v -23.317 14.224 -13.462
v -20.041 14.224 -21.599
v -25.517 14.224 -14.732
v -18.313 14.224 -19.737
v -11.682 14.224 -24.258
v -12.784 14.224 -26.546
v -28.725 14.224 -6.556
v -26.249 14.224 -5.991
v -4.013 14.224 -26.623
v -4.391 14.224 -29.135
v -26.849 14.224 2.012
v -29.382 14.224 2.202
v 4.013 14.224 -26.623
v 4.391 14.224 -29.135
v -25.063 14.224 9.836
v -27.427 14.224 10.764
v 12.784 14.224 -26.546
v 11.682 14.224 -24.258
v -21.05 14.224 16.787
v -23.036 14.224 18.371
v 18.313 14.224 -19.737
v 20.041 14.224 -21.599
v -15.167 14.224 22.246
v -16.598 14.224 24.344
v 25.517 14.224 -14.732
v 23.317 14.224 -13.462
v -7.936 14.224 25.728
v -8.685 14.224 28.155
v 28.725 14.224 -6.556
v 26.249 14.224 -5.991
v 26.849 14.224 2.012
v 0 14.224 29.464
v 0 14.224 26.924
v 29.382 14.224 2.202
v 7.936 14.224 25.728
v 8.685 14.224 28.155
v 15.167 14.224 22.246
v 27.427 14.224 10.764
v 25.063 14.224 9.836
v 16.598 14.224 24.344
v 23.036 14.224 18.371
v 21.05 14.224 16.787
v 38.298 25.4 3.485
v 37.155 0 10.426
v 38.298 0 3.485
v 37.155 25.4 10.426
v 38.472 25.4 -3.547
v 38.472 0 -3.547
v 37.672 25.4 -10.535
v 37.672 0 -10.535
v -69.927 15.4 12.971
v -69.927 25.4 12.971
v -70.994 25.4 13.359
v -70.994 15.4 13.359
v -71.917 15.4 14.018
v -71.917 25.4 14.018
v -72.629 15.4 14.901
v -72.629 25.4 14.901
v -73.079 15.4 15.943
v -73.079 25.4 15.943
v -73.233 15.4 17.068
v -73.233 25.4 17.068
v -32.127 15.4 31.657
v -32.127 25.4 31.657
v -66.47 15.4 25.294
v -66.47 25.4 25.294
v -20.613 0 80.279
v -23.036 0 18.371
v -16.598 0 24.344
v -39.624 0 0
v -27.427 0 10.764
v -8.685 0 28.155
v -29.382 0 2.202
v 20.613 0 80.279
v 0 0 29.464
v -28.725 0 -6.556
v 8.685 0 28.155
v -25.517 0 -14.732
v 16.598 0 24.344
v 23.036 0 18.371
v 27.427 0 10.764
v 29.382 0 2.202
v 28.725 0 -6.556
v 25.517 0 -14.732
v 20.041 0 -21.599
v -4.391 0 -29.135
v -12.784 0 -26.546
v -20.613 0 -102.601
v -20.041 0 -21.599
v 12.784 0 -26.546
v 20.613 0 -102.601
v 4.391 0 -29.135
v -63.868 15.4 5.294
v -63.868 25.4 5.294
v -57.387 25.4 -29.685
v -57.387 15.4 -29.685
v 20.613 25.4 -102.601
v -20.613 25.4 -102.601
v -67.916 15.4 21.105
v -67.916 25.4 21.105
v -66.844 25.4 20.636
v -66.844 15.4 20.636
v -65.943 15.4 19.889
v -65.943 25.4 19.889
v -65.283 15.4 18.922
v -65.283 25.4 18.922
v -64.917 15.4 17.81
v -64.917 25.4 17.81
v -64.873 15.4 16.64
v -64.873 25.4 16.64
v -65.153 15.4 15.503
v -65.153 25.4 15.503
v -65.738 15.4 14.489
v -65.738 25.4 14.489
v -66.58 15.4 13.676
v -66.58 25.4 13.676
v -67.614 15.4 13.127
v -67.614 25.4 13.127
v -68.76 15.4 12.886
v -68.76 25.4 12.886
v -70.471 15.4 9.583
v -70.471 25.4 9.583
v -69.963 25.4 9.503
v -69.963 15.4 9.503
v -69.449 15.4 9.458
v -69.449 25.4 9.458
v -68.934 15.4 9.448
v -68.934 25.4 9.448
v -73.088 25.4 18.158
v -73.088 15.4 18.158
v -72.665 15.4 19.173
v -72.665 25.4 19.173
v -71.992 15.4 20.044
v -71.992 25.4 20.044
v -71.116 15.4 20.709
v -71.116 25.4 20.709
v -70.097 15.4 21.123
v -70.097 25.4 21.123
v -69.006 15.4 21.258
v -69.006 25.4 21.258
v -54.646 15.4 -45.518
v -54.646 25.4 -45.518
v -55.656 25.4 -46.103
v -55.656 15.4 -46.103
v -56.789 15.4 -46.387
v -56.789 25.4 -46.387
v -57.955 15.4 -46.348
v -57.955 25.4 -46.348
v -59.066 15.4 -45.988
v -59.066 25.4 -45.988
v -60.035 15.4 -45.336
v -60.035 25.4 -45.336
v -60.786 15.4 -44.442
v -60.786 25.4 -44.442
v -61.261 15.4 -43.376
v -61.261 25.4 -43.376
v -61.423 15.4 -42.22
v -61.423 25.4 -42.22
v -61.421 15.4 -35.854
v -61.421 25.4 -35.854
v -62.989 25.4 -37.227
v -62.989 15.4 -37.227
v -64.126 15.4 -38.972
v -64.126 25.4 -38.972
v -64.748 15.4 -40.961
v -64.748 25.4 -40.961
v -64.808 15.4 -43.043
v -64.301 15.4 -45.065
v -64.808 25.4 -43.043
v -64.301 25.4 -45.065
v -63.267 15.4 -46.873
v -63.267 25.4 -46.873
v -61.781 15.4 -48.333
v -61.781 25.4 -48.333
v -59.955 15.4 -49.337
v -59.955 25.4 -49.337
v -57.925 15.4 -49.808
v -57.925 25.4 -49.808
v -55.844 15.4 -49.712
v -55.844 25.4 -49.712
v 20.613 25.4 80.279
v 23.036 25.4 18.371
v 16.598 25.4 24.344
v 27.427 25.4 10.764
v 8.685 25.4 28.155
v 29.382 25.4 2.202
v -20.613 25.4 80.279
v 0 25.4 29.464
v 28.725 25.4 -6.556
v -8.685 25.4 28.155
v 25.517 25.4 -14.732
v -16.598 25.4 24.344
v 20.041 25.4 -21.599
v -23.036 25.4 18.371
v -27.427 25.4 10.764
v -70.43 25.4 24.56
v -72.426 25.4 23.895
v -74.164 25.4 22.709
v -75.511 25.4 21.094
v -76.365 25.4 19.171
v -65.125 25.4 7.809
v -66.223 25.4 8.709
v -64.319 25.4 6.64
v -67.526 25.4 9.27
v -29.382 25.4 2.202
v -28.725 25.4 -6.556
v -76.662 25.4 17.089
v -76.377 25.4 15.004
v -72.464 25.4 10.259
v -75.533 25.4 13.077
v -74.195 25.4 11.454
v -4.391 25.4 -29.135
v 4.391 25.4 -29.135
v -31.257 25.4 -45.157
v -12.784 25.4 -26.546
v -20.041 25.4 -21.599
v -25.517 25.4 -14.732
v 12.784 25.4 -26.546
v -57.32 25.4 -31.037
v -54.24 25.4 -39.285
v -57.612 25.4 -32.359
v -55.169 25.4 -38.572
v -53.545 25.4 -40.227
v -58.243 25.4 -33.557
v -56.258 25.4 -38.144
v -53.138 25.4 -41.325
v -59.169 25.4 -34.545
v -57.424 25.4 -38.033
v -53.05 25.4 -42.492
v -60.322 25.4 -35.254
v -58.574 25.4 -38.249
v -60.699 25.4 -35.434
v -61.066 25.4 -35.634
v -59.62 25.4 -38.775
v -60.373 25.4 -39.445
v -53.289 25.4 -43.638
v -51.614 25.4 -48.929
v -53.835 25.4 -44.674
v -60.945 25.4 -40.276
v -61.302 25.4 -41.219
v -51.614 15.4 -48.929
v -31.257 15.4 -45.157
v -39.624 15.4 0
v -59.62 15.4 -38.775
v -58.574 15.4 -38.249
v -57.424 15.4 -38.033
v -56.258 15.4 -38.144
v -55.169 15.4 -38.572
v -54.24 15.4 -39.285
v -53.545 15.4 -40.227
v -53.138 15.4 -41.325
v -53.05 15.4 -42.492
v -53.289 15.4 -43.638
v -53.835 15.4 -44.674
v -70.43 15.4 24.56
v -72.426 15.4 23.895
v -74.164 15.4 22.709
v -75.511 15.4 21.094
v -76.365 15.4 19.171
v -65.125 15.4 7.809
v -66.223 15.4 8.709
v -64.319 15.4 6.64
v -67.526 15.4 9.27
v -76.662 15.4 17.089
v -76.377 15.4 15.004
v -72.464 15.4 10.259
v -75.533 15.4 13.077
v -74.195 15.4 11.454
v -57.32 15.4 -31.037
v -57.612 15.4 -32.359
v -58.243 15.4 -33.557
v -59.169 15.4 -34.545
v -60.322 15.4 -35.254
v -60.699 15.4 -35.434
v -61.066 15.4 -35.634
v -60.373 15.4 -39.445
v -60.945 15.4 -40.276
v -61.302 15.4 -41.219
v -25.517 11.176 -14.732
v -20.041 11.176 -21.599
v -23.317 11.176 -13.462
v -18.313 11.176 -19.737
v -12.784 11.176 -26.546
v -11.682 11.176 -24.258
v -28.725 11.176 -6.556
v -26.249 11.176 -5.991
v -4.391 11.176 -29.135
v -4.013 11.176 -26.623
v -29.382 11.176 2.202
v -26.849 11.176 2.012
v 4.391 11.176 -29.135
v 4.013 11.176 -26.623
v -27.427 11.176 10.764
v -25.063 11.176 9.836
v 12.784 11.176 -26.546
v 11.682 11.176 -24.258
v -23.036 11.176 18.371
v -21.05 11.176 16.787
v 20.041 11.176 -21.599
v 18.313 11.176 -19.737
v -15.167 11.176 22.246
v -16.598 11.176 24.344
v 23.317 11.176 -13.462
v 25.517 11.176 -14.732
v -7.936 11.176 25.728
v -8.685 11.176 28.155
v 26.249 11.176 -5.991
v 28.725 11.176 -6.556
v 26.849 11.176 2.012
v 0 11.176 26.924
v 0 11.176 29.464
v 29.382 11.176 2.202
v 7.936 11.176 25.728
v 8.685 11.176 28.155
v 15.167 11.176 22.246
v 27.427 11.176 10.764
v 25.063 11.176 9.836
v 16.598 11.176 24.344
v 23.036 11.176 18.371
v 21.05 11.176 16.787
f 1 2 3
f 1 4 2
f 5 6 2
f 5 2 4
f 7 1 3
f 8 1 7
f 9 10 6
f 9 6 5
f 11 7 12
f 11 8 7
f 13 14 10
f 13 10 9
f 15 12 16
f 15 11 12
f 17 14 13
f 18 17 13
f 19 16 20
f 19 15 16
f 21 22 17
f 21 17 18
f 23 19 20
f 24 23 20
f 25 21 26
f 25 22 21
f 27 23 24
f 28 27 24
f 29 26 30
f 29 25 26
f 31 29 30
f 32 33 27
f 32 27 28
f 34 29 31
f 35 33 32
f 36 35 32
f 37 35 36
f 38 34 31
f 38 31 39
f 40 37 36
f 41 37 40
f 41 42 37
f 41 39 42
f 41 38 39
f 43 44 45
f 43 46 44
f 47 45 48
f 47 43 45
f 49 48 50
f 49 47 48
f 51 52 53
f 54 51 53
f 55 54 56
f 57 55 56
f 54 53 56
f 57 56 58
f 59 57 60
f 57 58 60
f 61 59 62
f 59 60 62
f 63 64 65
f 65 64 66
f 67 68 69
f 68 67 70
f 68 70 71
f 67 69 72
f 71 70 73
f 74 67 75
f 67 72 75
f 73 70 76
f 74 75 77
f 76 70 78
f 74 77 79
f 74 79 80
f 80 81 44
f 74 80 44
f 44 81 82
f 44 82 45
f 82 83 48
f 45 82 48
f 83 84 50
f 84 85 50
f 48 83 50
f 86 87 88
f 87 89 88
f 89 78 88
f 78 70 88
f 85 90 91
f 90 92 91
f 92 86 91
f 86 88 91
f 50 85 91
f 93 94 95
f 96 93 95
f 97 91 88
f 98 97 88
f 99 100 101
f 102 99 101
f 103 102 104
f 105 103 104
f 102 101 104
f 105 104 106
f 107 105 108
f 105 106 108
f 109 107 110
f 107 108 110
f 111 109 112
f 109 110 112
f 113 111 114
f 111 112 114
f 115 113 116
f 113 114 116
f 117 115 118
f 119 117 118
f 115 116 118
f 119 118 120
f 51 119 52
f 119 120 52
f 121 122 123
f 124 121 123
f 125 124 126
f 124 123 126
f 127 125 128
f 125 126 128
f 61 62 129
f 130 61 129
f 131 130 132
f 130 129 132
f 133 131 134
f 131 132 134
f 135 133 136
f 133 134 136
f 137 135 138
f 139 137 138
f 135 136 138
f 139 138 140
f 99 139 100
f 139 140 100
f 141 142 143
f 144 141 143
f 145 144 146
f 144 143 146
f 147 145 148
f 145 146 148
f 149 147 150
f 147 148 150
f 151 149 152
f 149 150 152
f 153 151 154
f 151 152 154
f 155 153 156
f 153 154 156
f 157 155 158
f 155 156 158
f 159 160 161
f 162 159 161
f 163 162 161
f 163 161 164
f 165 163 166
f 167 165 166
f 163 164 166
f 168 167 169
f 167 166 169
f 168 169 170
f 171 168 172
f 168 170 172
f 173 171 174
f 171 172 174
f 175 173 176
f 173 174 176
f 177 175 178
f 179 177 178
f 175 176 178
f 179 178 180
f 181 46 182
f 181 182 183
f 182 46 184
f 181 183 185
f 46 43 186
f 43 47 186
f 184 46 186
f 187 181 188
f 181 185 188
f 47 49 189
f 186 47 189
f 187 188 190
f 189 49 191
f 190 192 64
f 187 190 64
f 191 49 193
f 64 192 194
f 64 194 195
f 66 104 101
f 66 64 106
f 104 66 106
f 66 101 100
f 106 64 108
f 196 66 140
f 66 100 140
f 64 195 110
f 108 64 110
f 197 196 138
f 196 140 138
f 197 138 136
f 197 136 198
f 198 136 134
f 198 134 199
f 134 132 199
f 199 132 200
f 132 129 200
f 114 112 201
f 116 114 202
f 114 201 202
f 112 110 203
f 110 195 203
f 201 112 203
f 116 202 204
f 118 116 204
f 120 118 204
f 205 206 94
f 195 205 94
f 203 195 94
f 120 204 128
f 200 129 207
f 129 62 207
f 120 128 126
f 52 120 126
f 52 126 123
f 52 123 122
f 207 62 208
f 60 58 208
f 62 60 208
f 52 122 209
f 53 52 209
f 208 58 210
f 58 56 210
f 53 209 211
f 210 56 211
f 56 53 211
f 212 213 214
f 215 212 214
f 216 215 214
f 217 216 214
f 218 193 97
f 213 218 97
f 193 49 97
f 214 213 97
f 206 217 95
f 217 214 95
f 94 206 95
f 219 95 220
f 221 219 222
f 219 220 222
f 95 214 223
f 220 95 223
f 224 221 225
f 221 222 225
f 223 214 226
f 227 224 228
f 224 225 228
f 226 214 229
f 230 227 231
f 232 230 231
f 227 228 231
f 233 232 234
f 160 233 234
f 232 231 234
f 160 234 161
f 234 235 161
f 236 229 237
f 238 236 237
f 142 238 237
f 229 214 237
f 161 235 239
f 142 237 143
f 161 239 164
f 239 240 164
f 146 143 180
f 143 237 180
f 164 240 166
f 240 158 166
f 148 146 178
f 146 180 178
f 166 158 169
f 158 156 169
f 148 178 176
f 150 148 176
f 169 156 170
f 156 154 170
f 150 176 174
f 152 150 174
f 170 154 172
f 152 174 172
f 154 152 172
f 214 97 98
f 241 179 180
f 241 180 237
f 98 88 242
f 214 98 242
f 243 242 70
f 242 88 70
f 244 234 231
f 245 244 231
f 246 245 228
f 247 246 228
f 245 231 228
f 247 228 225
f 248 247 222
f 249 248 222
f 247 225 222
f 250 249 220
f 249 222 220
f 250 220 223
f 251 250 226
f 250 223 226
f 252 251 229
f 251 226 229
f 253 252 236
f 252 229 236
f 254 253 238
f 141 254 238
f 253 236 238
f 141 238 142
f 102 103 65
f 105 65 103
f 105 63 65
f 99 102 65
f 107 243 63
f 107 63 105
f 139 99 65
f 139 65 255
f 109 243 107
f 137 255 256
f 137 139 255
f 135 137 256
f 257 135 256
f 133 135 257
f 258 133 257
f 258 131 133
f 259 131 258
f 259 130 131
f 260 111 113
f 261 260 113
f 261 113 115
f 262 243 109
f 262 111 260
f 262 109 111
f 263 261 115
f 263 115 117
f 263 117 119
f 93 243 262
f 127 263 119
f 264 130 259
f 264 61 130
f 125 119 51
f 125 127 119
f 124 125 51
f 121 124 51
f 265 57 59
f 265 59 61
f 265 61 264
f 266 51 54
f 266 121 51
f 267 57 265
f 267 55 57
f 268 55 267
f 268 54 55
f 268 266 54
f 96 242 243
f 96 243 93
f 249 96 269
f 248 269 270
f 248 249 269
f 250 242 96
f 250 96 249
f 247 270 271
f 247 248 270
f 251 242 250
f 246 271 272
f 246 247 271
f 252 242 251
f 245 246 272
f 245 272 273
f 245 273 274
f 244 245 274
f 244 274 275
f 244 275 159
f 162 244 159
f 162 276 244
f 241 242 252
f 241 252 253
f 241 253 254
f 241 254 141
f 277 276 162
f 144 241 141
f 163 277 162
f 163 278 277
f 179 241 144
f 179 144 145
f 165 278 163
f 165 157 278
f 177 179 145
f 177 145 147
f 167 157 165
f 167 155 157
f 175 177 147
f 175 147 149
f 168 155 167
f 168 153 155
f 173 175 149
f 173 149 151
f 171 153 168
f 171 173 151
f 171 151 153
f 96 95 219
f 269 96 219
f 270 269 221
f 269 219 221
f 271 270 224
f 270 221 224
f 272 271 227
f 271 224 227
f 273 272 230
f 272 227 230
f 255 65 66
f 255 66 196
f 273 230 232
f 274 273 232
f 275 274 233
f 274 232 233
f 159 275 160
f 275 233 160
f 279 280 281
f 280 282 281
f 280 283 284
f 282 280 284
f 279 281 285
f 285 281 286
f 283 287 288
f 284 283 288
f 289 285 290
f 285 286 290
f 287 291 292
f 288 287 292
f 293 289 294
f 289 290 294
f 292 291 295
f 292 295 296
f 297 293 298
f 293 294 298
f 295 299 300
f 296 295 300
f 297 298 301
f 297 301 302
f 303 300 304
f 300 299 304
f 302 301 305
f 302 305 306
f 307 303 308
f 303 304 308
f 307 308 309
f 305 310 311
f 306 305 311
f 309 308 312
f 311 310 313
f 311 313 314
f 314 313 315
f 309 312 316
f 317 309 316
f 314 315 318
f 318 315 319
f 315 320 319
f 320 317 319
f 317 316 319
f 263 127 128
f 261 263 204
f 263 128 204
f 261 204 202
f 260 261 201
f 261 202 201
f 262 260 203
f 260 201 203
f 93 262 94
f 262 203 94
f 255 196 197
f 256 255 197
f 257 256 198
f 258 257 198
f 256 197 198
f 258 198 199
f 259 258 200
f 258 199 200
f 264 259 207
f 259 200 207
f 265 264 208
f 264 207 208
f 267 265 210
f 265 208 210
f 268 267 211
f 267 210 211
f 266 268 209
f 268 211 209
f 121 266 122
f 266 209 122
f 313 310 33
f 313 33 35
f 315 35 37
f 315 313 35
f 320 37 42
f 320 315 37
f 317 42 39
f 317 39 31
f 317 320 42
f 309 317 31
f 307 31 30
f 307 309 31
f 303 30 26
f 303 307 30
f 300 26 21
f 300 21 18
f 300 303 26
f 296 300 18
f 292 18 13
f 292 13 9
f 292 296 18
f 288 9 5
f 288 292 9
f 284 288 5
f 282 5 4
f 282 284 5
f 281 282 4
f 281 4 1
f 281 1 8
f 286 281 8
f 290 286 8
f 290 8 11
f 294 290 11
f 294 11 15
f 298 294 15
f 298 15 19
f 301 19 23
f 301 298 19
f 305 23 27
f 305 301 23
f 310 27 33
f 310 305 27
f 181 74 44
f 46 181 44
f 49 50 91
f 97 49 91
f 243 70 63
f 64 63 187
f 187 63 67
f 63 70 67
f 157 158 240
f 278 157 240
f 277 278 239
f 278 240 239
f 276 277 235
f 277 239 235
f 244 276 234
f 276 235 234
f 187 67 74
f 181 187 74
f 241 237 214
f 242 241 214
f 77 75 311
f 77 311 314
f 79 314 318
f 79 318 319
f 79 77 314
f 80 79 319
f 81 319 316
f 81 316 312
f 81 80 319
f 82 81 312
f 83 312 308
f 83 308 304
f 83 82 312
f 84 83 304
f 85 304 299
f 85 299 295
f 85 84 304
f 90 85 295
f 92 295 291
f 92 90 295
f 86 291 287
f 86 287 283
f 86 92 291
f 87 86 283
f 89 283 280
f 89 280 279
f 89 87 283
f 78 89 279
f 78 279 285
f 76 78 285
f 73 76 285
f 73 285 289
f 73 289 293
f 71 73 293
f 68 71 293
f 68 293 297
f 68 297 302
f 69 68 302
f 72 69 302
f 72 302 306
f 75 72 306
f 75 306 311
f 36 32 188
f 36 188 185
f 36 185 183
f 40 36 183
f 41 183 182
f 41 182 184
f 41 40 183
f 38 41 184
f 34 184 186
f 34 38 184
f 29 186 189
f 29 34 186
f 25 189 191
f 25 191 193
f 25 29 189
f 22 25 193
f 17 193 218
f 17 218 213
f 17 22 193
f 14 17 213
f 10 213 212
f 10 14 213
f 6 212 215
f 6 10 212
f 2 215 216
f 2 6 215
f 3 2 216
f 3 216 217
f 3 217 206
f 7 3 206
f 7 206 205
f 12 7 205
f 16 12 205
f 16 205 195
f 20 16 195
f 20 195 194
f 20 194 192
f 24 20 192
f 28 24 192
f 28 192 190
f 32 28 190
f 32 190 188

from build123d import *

# Parameters (mm, degrees)
SKETCH1_R                      = 29.464
BASE_DEPTH                     = 25.4
FILLET2_R                      = 50.8
BOSS_EXTRUDE3_DEPTH            = 10
MID_FEATURE_BEARING_DEPTH      = 1.524
MID_FEATURE_BEARING_DEPTH_BACK = 1.524
SKETCH8_R                      = 29.464
SKETCH8_R_2                    = 26.924


with BuildPart() as part:
    # Sketch1 → Base (new body)
    with BuildSketch(Plane(origin=(0, 0, 0), x_dir=(1, 0, 0), z_dir=(0, 1, 0))):
        Polygon((-20.613470334, -80.279427719), (20.613470334, -80.279427719), (39.624, 0), (20.613470334, 102.600572281), (-20.613470334, 102.600572281), (-39.624, 0), align=None)
        with Locations(Location((0, 0, 0), (0, 0, 270))):
            Circle(SKETCH1_R, mode=Mode.SUBTRACT)
    extrude(amount=BASE_DEPTH)

    # Fillet2
    fillet2_edges = [part.edges().sort_by_distance(p)[0] for p in [
        (39.624, 12.7, 0),
    ]]
    fillet(fillet2_edges, radius=FILLET2_R)

    # Sketch3 → Boss-Extrude3 (add)
    with BuildSketch(Plane(origin=(0, 25.4, 0), x_dir=(-1, 0, 0), z_dir=(0, -1, 0))):
        with BuildLine():
            Line((51.614471231, 48.928527053), (31.257084114, 45.156572344))
            Line((31.257084114, 45.156572344), (39.624, 0))
            Line((39.624, 0), (32.127488633, -31.65696343))
            Line((32.127488633, -31.65696343), (66.470159483, -25.293720531))
            ThreePointArc((66.470159483, -25.293720531), (67.22595128, -23.21046907), (67.916469509, -21.10468122))
            ThreePointArc((67.916469509, -21.10468122), (64.973148378, -16.061787909), (69.92712938, -12.971159419))
            ThreePointArc((69.92712938, -12.971159419), (70.219719772, -11.280308293), (70.471431194, -9.582890245))
            ThreePointArc((70.471431194, -9.582890245), (69.706370171, -9.476600605), (68.934479365, -9.448308557))
            ThreePointArc((68.934479365, -9.448308557), (65.642119146, -8.297198831), (63.868033442, -5.294315329))
            Line((63.868033442, -5.294315329), (57.38681967, 29.685048936))
            ThreePointArc((57.38681967, 29.685048936), (57.887770412, 32.979114965), (60.322037489, 35.25423396))
            ThreePointArc((60.322037489, 35.25423396), (60.883831005, 35.531602368), (61.420938914, 35.854186128))
            ThreePointArc((61.420938914, 35.854186128), (60.538035517, 37.32560322), (59.61988942, 38.775290915))
            ThreePointArc((59.61988942, 38.775290915), (53.859768583, 39.731805511), (54.646150047, 45.517608517))
            ThreePointArc((54.646150047, 45.517608517), (53.157675832, 47.247390405), (51.614471231, 48.928527053))
        make_face()
        with BuildLine():
            Line((55.84413555, 49.712227935), (51.614471231, 48.928527053))
            ThreePointArc((51.614471231, 48.928527053), (53.157675832, 47.247390405), (54.646150047, 45.517608517))
            ThreePointArc((54.646150047, 45.517608517), (59.06617769, 45.988270979), (61.423391664, 42.219755382))
            ThreePointArc((61.423391664, 42.219755382), (60.945239903, 40.275728903), (59.61988942, 38.775290915))
            ThreePointArc((59.61988942, 38.775290915), (60.538035517, 37.32560322), (61.420938914, 35.854186128))
            ThreePointArc((61.420938914, 35.854186128), (64.301460789, 45.064515776), (55.84413555, 49.712227935))
        make_face()
        with BuildLine():
            ThreePointArc((67.916469509, -21.10468122), (67.22595128, -23.21046907), (66.470159483, -25.293720531))
            Line((66.470159483, -25.293720531), (70.42993181, -24.560027067))
            ThreePointArc((70.42993181, -24.560027067), (76.661646445, -17.088668302), (70.471431194, -9.582890245))
            ThreePointArc((70.471431194, -9.582890245), (70.219719772, -11.280308293), (69.92712938, -12.971159419))
            ThreePointArc((69.92712938, -12.971159419), (72.303225741, -14.435678319), (73.232675696, -17.067554514))
            ThreePointArc((73.232675696, -17.067554514), (71.576309977, -20.405234856), (67.916469509, -21.10468122))
        make_face()
    extrude(amount=BOSS_EXTRUDE3_DEPTH)

    # Sketch8 → mid-feature bearing (add, two sides: drawn at the far end of the back side and taken through both)
    with BuildSketch(Plane(origin=(0, 12.7, 0), x_dir=(1, 0, 0), z_dir=(0, 1, 0)).offset(-MID_FEATURE_BEARING_DEPTH_BACK)):
        with Locations(Location((0, 0, 0), (0, 0, 270))):
            Circle(SKETCH8_R)
        with Locations(Location((0, 0, 0), (0, 0, 270))):
            Circle(SKETCH8_R_2, mode=Mode.SUBTRACT)
    extrude(amount=MID_FEATURE_BEARING_DEPTH + MID_FEATURE_BEARING_DEPTH_BACK)


solid = part.part
